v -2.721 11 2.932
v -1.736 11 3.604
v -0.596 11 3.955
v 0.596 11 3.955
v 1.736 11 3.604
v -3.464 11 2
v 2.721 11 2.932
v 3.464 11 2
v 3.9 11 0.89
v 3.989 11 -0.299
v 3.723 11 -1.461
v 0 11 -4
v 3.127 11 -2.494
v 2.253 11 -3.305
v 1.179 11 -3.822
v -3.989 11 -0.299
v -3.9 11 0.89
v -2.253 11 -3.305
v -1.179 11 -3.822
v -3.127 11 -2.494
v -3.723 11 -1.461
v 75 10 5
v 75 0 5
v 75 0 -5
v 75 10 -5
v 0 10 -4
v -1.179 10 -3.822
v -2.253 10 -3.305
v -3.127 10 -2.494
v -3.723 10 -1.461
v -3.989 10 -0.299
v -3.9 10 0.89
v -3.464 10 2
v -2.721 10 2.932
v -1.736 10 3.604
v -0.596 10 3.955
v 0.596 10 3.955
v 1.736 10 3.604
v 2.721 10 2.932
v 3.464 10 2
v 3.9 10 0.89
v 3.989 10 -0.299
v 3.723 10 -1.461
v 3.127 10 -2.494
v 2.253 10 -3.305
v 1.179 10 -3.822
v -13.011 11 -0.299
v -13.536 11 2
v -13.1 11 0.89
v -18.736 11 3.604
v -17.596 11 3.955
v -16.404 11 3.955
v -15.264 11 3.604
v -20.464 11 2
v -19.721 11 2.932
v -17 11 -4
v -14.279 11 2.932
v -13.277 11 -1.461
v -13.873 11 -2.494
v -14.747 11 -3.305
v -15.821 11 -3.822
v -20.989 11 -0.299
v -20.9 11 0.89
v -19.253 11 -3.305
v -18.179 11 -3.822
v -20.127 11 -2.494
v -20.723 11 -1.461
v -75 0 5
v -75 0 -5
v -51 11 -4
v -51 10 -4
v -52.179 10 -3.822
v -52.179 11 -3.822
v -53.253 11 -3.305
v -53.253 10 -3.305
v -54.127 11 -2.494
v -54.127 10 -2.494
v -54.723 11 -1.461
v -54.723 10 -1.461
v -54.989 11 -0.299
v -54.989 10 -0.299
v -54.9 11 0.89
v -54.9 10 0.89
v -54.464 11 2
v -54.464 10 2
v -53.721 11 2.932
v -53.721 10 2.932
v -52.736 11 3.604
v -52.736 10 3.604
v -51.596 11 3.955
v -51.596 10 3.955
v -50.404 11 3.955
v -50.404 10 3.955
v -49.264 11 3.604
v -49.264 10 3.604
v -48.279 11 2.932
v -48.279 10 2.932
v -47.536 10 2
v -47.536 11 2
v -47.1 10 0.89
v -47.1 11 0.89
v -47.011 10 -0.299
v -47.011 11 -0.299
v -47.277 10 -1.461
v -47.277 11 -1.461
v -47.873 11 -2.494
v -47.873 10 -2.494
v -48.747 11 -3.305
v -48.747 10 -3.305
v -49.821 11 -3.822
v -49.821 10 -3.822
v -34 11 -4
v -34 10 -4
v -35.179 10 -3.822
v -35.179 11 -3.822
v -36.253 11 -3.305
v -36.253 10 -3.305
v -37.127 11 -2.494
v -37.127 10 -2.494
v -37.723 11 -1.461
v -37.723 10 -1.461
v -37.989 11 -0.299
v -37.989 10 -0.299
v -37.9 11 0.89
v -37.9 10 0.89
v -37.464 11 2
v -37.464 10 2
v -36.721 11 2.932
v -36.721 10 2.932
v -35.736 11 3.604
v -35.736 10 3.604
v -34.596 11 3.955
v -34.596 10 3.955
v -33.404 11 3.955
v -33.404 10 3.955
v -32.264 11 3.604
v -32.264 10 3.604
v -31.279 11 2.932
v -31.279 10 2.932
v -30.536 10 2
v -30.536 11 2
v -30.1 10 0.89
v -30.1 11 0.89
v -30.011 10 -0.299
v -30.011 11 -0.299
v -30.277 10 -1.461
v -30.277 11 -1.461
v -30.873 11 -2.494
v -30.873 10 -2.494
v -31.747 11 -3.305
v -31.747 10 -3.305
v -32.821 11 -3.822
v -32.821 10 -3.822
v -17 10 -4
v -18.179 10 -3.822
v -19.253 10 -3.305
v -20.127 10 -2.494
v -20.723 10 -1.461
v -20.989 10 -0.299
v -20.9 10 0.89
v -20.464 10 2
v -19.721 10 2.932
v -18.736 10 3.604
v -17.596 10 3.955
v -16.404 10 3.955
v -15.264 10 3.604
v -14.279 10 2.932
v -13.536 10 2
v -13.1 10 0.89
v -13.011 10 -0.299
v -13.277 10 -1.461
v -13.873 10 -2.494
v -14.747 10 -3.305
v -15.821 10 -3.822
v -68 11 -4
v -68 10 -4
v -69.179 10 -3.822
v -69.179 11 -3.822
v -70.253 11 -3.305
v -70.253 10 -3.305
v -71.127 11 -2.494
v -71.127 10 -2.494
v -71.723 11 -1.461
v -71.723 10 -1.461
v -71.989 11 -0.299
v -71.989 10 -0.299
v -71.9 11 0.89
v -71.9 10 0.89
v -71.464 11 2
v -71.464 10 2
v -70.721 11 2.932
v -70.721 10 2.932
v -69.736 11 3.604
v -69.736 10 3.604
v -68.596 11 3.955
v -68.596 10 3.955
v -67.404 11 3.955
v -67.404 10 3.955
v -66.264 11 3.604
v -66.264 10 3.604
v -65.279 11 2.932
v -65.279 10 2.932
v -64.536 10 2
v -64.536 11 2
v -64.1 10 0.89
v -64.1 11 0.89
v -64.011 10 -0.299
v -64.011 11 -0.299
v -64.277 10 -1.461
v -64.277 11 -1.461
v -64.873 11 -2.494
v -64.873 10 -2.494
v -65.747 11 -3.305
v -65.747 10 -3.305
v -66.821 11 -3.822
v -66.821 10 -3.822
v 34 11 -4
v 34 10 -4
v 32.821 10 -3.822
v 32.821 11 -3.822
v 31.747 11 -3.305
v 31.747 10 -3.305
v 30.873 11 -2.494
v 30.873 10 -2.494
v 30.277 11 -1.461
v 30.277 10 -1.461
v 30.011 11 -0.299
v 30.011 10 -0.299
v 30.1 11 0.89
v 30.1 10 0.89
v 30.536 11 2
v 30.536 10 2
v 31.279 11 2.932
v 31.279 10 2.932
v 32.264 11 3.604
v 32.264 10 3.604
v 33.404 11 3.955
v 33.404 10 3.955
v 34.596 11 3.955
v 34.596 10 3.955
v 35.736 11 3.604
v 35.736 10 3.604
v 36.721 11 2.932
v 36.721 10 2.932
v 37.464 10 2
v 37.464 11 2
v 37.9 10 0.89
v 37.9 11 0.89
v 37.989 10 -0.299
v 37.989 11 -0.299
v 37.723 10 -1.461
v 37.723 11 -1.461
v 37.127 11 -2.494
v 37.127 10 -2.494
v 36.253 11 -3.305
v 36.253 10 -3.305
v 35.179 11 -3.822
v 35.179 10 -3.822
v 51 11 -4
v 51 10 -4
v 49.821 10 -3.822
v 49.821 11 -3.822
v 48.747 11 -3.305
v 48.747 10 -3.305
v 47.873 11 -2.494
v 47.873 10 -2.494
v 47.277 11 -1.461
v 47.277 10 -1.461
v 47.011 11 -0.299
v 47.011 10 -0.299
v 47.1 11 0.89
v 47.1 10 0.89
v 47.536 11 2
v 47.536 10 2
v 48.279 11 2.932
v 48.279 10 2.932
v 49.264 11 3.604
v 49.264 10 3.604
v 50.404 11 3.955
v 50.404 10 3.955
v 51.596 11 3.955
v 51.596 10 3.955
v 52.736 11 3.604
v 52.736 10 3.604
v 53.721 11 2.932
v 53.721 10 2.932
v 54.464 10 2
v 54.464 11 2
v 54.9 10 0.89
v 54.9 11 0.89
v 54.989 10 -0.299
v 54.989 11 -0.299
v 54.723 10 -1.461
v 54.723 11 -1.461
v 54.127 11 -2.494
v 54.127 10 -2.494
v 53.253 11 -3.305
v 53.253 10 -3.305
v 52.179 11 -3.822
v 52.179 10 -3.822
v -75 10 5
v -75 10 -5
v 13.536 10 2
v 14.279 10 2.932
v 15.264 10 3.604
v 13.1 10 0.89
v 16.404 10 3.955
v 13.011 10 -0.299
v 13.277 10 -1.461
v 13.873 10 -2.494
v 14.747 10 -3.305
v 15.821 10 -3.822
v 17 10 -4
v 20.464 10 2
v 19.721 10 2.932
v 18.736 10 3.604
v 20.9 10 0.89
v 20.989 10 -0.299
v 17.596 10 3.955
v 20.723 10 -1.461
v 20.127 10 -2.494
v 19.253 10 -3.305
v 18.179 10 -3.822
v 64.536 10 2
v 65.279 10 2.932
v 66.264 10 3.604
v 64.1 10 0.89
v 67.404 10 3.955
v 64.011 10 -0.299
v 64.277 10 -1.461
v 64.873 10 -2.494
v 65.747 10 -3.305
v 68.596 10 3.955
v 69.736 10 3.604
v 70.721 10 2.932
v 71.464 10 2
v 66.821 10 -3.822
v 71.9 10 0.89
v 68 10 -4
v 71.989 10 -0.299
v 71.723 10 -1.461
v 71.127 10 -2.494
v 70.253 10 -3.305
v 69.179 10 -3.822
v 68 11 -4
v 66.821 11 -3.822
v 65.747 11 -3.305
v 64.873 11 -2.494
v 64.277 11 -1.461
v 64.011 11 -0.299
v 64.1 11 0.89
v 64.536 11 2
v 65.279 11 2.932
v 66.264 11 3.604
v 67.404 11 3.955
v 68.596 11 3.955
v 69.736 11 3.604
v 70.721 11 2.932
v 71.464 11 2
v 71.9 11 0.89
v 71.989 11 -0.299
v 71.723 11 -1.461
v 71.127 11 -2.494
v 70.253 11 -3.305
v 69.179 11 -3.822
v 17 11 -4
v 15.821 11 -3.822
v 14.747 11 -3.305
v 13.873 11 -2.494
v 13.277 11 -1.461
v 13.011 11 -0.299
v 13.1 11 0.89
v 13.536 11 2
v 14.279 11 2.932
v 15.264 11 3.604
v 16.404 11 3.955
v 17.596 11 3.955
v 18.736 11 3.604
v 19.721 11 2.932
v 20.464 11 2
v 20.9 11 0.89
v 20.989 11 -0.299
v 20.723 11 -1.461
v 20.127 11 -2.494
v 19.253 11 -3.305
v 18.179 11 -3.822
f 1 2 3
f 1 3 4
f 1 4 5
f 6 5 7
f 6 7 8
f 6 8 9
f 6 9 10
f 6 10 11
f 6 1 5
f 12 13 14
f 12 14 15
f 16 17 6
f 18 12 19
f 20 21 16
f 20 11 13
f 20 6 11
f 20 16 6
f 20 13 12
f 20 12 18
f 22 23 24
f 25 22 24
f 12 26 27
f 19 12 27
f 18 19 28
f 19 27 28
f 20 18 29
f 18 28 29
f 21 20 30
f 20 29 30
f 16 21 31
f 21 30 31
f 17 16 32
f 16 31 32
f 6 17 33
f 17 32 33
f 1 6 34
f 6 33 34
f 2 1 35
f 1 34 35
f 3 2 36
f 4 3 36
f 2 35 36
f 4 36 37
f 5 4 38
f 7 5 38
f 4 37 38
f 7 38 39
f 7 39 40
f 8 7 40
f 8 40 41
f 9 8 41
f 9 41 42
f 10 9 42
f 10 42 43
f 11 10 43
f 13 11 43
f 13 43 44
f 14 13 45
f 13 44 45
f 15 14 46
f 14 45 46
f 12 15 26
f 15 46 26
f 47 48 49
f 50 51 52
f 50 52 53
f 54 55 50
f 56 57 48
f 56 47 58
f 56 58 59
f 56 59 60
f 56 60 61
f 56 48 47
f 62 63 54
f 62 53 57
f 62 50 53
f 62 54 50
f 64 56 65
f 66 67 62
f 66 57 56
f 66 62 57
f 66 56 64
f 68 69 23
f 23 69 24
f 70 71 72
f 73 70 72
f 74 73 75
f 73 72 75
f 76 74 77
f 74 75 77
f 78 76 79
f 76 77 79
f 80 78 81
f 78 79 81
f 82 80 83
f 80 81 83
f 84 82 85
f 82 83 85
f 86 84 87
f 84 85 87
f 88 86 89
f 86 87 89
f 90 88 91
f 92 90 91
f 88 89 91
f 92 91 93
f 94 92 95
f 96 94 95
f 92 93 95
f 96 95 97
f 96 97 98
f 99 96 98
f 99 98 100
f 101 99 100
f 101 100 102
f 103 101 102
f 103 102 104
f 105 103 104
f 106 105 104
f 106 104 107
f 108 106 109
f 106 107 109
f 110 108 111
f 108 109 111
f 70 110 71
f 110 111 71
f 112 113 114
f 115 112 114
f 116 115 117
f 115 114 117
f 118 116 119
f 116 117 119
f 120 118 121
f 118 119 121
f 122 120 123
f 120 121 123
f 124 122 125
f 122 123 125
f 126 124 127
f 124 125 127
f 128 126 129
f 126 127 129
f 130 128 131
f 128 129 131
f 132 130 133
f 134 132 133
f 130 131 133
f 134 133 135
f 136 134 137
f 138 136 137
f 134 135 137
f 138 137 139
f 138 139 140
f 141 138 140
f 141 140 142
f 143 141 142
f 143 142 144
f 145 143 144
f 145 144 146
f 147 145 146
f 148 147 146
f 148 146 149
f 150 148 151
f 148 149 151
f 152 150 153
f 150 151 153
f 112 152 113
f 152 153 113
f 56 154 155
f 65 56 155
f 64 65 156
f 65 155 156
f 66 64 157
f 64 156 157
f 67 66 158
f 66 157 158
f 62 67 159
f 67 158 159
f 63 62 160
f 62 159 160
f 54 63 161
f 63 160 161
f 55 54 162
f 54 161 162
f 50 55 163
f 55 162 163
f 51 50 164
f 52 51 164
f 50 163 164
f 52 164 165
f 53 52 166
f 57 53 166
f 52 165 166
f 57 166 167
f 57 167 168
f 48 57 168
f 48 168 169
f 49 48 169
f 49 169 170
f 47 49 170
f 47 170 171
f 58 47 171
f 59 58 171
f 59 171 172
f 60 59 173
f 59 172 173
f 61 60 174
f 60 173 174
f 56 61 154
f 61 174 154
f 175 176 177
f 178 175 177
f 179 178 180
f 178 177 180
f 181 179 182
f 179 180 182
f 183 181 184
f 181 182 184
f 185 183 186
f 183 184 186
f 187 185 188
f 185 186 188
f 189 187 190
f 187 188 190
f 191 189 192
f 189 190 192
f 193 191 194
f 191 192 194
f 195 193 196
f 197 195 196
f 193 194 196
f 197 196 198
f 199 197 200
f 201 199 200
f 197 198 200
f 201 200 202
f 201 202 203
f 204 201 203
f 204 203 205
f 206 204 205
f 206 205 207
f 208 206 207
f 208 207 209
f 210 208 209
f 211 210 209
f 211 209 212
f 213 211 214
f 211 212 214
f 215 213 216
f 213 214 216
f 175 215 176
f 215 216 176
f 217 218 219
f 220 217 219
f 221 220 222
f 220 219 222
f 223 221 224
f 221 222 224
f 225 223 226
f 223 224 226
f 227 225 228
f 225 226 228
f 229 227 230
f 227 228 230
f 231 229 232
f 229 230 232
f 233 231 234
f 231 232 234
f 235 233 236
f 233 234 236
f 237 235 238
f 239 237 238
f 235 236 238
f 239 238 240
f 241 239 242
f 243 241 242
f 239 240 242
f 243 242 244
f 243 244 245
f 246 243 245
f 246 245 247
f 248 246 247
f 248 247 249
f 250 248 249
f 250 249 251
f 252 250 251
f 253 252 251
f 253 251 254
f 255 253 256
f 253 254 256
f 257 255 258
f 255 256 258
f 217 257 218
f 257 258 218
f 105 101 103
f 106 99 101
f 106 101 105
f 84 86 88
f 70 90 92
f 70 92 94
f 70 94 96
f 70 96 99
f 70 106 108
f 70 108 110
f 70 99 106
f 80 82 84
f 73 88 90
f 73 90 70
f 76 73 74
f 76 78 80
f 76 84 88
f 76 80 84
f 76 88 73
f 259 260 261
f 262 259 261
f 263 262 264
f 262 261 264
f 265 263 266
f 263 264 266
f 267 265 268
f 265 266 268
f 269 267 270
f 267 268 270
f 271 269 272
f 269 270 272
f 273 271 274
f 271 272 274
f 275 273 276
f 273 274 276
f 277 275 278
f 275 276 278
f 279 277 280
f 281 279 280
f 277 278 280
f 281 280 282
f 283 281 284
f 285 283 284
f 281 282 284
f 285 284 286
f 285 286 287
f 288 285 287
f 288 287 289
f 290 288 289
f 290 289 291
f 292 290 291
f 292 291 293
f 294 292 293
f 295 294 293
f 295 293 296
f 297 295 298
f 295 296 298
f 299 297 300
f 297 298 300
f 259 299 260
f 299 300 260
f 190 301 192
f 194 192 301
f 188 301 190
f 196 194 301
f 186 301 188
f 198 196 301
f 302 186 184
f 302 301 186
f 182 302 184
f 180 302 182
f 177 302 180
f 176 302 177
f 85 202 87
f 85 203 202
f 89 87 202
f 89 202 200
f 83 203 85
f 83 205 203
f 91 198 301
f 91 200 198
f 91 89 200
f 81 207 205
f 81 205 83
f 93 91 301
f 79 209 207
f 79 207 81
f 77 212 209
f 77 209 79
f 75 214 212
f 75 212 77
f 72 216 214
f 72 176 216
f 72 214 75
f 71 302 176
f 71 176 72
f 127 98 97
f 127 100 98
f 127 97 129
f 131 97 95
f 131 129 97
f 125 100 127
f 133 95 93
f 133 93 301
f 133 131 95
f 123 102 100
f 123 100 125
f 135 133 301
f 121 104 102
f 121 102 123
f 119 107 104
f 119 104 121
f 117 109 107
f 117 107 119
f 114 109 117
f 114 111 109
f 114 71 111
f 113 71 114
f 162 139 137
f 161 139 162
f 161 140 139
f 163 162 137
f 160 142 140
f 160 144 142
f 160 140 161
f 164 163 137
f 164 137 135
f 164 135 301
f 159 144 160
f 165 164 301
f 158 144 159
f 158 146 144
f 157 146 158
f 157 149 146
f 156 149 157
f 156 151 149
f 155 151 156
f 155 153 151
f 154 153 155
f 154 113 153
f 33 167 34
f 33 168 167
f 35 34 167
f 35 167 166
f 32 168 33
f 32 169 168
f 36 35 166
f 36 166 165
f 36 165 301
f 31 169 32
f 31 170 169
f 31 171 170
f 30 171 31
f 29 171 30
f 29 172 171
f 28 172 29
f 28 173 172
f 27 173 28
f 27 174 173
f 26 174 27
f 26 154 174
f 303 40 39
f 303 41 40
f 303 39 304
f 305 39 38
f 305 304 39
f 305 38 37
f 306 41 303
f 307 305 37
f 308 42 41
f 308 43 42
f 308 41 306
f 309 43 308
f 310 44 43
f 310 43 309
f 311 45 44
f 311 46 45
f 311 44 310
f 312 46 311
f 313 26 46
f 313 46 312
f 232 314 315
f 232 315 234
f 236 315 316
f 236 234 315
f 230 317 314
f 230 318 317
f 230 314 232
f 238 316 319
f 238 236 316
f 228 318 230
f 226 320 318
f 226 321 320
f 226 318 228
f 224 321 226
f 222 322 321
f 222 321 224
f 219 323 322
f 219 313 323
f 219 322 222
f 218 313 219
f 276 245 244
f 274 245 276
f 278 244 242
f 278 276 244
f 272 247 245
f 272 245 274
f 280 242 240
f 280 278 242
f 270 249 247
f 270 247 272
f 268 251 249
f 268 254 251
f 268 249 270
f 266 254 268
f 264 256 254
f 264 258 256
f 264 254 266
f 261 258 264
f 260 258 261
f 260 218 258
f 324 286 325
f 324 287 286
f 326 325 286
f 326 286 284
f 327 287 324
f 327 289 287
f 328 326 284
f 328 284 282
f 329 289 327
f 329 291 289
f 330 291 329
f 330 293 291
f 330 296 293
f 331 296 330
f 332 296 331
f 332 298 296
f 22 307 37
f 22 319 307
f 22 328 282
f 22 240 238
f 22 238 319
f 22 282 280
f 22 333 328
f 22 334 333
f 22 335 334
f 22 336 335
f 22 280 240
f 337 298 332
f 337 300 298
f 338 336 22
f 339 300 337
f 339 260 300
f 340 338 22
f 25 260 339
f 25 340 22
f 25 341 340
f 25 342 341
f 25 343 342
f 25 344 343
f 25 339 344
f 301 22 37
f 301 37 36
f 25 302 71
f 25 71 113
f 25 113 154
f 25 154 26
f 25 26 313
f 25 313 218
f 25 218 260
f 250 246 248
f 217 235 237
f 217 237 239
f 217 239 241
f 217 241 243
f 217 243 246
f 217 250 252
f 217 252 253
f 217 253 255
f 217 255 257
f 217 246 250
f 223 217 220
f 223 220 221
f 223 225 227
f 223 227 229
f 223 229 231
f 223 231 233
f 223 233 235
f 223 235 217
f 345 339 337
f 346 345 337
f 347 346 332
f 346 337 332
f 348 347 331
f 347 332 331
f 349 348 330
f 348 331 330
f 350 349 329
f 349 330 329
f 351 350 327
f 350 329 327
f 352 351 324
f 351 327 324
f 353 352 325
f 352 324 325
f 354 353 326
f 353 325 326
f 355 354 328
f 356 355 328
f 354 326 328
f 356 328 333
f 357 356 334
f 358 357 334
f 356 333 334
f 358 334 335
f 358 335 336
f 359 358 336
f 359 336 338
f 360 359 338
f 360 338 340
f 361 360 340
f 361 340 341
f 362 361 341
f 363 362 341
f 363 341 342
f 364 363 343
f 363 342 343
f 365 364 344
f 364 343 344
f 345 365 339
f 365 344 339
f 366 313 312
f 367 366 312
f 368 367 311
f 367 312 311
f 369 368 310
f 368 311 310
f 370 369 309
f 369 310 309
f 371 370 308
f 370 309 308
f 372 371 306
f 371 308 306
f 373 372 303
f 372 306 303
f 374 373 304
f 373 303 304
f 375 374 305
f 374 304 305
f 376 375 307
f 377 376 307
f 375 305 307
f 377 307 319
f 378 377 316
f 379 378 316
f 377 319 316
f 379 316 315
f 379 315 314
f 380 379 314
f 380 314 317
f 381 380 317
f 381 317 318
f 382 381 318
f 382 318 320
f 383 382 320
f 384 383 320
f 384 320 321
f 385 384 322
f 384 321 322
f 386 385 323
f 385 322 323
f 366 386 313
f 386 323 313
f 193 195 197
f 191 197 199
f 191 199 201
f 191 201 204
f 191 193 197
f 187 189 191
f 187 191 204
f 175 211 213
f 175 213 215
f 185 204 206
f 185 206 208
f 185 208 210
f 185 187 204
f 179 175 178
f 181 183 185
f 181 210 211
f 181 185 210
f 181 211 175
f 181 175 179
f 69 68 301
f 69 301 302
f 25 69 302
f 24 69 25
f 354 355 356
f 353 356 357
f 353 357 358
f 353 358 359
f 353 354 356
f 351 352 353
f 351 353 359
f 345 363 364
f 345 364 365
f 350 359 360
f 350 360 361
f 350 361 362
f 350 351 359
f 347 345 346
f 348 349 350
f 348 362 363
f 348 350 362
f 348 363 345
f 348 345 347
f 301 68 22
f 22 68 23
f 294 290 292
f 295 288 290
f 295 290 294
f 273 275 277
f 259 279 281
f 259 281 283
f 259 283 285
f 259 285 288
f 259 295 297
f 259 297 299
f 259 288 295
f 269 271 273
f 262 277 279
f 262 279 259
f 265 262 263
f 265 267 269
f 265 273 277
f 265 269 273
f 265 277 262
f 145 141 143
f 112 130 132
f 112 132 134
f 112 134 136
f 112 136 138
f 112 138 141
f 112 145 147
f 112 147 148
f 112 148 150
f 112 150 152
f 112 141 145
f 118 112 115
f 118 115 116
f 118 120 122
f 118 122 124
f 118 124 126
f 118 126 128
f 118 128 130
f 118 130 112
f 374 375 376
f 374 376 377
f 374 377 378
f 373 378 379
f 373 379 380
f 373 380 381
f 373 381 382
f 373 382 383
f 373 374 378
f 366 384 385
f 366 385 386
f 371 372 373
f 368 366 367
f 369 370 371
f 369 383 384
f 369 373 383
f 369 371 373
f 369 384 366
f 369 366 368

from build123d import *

# Parameters (mm, degrees)
SKETCH1_W           = 150
SKETCH1_H           = 10
BOSS_EXTRUDE1_DEPTH = 10
SKETCH2_R           = 4
BOSS_EXTRUDE2_DEPTH = 1


with BuildPart() as part:
    # Sketch1 → Boss-Extrude1 (new body)
    with BuildSketch(Plane(origin=(0, 0, 0), x_dir=(1, 0, 0), z_dir=(0, 1, 0))):
        Rectangle(SKETCH1_W, SKETCH1_H)
    extrude(amount=BOSS_EXTRUDE1_DEPTH)

    # Sketch2 → Boss-Extrude2 (add)
    with BuildSketch(Plane(origin=(0, 10, 0), x_dir=(1, 0, 0), z_dir=(0, 1, 0))):
        with Locations(Location((0, 0, 0), (0, 0, 90))):
            Circle(SKETCH2_R)
        with Locations(Location((17, 0, 0), (0, 0, 90))):
            Circle(SKETCH2_R)
        with Locations(Location((34, 0, 0), (0, 0, 90))):
            Circle(SKETCH2_R)
        with Locations(Location((51, 0, 0), (0, 0, 90))):
            Circle(SKETCH2_R)
        with Locations(Location((68, 0, 0), (0, 0, 90))):
            Circle(SKETCH2_R)
        with Locations(Location((-17, 0, 0), (0, 0, 90))):
            Circle(SKETCH2_R)
        with Locations(Location((-34, 0, 0), (0, 0, 90))):
            Circle(SKETCH2_R)
        with Locations(Location((-51, 0, 0), (0, 0, 90))):
            Circle(SKETCH2_R)
        with Locations(Location((-68, 0, 0), (0, 0, 90))):
            Circle(SKETCH2_R)
    extrude(amount=BOSS_EXTRUDE2_DEPTH)


solid = part.part
